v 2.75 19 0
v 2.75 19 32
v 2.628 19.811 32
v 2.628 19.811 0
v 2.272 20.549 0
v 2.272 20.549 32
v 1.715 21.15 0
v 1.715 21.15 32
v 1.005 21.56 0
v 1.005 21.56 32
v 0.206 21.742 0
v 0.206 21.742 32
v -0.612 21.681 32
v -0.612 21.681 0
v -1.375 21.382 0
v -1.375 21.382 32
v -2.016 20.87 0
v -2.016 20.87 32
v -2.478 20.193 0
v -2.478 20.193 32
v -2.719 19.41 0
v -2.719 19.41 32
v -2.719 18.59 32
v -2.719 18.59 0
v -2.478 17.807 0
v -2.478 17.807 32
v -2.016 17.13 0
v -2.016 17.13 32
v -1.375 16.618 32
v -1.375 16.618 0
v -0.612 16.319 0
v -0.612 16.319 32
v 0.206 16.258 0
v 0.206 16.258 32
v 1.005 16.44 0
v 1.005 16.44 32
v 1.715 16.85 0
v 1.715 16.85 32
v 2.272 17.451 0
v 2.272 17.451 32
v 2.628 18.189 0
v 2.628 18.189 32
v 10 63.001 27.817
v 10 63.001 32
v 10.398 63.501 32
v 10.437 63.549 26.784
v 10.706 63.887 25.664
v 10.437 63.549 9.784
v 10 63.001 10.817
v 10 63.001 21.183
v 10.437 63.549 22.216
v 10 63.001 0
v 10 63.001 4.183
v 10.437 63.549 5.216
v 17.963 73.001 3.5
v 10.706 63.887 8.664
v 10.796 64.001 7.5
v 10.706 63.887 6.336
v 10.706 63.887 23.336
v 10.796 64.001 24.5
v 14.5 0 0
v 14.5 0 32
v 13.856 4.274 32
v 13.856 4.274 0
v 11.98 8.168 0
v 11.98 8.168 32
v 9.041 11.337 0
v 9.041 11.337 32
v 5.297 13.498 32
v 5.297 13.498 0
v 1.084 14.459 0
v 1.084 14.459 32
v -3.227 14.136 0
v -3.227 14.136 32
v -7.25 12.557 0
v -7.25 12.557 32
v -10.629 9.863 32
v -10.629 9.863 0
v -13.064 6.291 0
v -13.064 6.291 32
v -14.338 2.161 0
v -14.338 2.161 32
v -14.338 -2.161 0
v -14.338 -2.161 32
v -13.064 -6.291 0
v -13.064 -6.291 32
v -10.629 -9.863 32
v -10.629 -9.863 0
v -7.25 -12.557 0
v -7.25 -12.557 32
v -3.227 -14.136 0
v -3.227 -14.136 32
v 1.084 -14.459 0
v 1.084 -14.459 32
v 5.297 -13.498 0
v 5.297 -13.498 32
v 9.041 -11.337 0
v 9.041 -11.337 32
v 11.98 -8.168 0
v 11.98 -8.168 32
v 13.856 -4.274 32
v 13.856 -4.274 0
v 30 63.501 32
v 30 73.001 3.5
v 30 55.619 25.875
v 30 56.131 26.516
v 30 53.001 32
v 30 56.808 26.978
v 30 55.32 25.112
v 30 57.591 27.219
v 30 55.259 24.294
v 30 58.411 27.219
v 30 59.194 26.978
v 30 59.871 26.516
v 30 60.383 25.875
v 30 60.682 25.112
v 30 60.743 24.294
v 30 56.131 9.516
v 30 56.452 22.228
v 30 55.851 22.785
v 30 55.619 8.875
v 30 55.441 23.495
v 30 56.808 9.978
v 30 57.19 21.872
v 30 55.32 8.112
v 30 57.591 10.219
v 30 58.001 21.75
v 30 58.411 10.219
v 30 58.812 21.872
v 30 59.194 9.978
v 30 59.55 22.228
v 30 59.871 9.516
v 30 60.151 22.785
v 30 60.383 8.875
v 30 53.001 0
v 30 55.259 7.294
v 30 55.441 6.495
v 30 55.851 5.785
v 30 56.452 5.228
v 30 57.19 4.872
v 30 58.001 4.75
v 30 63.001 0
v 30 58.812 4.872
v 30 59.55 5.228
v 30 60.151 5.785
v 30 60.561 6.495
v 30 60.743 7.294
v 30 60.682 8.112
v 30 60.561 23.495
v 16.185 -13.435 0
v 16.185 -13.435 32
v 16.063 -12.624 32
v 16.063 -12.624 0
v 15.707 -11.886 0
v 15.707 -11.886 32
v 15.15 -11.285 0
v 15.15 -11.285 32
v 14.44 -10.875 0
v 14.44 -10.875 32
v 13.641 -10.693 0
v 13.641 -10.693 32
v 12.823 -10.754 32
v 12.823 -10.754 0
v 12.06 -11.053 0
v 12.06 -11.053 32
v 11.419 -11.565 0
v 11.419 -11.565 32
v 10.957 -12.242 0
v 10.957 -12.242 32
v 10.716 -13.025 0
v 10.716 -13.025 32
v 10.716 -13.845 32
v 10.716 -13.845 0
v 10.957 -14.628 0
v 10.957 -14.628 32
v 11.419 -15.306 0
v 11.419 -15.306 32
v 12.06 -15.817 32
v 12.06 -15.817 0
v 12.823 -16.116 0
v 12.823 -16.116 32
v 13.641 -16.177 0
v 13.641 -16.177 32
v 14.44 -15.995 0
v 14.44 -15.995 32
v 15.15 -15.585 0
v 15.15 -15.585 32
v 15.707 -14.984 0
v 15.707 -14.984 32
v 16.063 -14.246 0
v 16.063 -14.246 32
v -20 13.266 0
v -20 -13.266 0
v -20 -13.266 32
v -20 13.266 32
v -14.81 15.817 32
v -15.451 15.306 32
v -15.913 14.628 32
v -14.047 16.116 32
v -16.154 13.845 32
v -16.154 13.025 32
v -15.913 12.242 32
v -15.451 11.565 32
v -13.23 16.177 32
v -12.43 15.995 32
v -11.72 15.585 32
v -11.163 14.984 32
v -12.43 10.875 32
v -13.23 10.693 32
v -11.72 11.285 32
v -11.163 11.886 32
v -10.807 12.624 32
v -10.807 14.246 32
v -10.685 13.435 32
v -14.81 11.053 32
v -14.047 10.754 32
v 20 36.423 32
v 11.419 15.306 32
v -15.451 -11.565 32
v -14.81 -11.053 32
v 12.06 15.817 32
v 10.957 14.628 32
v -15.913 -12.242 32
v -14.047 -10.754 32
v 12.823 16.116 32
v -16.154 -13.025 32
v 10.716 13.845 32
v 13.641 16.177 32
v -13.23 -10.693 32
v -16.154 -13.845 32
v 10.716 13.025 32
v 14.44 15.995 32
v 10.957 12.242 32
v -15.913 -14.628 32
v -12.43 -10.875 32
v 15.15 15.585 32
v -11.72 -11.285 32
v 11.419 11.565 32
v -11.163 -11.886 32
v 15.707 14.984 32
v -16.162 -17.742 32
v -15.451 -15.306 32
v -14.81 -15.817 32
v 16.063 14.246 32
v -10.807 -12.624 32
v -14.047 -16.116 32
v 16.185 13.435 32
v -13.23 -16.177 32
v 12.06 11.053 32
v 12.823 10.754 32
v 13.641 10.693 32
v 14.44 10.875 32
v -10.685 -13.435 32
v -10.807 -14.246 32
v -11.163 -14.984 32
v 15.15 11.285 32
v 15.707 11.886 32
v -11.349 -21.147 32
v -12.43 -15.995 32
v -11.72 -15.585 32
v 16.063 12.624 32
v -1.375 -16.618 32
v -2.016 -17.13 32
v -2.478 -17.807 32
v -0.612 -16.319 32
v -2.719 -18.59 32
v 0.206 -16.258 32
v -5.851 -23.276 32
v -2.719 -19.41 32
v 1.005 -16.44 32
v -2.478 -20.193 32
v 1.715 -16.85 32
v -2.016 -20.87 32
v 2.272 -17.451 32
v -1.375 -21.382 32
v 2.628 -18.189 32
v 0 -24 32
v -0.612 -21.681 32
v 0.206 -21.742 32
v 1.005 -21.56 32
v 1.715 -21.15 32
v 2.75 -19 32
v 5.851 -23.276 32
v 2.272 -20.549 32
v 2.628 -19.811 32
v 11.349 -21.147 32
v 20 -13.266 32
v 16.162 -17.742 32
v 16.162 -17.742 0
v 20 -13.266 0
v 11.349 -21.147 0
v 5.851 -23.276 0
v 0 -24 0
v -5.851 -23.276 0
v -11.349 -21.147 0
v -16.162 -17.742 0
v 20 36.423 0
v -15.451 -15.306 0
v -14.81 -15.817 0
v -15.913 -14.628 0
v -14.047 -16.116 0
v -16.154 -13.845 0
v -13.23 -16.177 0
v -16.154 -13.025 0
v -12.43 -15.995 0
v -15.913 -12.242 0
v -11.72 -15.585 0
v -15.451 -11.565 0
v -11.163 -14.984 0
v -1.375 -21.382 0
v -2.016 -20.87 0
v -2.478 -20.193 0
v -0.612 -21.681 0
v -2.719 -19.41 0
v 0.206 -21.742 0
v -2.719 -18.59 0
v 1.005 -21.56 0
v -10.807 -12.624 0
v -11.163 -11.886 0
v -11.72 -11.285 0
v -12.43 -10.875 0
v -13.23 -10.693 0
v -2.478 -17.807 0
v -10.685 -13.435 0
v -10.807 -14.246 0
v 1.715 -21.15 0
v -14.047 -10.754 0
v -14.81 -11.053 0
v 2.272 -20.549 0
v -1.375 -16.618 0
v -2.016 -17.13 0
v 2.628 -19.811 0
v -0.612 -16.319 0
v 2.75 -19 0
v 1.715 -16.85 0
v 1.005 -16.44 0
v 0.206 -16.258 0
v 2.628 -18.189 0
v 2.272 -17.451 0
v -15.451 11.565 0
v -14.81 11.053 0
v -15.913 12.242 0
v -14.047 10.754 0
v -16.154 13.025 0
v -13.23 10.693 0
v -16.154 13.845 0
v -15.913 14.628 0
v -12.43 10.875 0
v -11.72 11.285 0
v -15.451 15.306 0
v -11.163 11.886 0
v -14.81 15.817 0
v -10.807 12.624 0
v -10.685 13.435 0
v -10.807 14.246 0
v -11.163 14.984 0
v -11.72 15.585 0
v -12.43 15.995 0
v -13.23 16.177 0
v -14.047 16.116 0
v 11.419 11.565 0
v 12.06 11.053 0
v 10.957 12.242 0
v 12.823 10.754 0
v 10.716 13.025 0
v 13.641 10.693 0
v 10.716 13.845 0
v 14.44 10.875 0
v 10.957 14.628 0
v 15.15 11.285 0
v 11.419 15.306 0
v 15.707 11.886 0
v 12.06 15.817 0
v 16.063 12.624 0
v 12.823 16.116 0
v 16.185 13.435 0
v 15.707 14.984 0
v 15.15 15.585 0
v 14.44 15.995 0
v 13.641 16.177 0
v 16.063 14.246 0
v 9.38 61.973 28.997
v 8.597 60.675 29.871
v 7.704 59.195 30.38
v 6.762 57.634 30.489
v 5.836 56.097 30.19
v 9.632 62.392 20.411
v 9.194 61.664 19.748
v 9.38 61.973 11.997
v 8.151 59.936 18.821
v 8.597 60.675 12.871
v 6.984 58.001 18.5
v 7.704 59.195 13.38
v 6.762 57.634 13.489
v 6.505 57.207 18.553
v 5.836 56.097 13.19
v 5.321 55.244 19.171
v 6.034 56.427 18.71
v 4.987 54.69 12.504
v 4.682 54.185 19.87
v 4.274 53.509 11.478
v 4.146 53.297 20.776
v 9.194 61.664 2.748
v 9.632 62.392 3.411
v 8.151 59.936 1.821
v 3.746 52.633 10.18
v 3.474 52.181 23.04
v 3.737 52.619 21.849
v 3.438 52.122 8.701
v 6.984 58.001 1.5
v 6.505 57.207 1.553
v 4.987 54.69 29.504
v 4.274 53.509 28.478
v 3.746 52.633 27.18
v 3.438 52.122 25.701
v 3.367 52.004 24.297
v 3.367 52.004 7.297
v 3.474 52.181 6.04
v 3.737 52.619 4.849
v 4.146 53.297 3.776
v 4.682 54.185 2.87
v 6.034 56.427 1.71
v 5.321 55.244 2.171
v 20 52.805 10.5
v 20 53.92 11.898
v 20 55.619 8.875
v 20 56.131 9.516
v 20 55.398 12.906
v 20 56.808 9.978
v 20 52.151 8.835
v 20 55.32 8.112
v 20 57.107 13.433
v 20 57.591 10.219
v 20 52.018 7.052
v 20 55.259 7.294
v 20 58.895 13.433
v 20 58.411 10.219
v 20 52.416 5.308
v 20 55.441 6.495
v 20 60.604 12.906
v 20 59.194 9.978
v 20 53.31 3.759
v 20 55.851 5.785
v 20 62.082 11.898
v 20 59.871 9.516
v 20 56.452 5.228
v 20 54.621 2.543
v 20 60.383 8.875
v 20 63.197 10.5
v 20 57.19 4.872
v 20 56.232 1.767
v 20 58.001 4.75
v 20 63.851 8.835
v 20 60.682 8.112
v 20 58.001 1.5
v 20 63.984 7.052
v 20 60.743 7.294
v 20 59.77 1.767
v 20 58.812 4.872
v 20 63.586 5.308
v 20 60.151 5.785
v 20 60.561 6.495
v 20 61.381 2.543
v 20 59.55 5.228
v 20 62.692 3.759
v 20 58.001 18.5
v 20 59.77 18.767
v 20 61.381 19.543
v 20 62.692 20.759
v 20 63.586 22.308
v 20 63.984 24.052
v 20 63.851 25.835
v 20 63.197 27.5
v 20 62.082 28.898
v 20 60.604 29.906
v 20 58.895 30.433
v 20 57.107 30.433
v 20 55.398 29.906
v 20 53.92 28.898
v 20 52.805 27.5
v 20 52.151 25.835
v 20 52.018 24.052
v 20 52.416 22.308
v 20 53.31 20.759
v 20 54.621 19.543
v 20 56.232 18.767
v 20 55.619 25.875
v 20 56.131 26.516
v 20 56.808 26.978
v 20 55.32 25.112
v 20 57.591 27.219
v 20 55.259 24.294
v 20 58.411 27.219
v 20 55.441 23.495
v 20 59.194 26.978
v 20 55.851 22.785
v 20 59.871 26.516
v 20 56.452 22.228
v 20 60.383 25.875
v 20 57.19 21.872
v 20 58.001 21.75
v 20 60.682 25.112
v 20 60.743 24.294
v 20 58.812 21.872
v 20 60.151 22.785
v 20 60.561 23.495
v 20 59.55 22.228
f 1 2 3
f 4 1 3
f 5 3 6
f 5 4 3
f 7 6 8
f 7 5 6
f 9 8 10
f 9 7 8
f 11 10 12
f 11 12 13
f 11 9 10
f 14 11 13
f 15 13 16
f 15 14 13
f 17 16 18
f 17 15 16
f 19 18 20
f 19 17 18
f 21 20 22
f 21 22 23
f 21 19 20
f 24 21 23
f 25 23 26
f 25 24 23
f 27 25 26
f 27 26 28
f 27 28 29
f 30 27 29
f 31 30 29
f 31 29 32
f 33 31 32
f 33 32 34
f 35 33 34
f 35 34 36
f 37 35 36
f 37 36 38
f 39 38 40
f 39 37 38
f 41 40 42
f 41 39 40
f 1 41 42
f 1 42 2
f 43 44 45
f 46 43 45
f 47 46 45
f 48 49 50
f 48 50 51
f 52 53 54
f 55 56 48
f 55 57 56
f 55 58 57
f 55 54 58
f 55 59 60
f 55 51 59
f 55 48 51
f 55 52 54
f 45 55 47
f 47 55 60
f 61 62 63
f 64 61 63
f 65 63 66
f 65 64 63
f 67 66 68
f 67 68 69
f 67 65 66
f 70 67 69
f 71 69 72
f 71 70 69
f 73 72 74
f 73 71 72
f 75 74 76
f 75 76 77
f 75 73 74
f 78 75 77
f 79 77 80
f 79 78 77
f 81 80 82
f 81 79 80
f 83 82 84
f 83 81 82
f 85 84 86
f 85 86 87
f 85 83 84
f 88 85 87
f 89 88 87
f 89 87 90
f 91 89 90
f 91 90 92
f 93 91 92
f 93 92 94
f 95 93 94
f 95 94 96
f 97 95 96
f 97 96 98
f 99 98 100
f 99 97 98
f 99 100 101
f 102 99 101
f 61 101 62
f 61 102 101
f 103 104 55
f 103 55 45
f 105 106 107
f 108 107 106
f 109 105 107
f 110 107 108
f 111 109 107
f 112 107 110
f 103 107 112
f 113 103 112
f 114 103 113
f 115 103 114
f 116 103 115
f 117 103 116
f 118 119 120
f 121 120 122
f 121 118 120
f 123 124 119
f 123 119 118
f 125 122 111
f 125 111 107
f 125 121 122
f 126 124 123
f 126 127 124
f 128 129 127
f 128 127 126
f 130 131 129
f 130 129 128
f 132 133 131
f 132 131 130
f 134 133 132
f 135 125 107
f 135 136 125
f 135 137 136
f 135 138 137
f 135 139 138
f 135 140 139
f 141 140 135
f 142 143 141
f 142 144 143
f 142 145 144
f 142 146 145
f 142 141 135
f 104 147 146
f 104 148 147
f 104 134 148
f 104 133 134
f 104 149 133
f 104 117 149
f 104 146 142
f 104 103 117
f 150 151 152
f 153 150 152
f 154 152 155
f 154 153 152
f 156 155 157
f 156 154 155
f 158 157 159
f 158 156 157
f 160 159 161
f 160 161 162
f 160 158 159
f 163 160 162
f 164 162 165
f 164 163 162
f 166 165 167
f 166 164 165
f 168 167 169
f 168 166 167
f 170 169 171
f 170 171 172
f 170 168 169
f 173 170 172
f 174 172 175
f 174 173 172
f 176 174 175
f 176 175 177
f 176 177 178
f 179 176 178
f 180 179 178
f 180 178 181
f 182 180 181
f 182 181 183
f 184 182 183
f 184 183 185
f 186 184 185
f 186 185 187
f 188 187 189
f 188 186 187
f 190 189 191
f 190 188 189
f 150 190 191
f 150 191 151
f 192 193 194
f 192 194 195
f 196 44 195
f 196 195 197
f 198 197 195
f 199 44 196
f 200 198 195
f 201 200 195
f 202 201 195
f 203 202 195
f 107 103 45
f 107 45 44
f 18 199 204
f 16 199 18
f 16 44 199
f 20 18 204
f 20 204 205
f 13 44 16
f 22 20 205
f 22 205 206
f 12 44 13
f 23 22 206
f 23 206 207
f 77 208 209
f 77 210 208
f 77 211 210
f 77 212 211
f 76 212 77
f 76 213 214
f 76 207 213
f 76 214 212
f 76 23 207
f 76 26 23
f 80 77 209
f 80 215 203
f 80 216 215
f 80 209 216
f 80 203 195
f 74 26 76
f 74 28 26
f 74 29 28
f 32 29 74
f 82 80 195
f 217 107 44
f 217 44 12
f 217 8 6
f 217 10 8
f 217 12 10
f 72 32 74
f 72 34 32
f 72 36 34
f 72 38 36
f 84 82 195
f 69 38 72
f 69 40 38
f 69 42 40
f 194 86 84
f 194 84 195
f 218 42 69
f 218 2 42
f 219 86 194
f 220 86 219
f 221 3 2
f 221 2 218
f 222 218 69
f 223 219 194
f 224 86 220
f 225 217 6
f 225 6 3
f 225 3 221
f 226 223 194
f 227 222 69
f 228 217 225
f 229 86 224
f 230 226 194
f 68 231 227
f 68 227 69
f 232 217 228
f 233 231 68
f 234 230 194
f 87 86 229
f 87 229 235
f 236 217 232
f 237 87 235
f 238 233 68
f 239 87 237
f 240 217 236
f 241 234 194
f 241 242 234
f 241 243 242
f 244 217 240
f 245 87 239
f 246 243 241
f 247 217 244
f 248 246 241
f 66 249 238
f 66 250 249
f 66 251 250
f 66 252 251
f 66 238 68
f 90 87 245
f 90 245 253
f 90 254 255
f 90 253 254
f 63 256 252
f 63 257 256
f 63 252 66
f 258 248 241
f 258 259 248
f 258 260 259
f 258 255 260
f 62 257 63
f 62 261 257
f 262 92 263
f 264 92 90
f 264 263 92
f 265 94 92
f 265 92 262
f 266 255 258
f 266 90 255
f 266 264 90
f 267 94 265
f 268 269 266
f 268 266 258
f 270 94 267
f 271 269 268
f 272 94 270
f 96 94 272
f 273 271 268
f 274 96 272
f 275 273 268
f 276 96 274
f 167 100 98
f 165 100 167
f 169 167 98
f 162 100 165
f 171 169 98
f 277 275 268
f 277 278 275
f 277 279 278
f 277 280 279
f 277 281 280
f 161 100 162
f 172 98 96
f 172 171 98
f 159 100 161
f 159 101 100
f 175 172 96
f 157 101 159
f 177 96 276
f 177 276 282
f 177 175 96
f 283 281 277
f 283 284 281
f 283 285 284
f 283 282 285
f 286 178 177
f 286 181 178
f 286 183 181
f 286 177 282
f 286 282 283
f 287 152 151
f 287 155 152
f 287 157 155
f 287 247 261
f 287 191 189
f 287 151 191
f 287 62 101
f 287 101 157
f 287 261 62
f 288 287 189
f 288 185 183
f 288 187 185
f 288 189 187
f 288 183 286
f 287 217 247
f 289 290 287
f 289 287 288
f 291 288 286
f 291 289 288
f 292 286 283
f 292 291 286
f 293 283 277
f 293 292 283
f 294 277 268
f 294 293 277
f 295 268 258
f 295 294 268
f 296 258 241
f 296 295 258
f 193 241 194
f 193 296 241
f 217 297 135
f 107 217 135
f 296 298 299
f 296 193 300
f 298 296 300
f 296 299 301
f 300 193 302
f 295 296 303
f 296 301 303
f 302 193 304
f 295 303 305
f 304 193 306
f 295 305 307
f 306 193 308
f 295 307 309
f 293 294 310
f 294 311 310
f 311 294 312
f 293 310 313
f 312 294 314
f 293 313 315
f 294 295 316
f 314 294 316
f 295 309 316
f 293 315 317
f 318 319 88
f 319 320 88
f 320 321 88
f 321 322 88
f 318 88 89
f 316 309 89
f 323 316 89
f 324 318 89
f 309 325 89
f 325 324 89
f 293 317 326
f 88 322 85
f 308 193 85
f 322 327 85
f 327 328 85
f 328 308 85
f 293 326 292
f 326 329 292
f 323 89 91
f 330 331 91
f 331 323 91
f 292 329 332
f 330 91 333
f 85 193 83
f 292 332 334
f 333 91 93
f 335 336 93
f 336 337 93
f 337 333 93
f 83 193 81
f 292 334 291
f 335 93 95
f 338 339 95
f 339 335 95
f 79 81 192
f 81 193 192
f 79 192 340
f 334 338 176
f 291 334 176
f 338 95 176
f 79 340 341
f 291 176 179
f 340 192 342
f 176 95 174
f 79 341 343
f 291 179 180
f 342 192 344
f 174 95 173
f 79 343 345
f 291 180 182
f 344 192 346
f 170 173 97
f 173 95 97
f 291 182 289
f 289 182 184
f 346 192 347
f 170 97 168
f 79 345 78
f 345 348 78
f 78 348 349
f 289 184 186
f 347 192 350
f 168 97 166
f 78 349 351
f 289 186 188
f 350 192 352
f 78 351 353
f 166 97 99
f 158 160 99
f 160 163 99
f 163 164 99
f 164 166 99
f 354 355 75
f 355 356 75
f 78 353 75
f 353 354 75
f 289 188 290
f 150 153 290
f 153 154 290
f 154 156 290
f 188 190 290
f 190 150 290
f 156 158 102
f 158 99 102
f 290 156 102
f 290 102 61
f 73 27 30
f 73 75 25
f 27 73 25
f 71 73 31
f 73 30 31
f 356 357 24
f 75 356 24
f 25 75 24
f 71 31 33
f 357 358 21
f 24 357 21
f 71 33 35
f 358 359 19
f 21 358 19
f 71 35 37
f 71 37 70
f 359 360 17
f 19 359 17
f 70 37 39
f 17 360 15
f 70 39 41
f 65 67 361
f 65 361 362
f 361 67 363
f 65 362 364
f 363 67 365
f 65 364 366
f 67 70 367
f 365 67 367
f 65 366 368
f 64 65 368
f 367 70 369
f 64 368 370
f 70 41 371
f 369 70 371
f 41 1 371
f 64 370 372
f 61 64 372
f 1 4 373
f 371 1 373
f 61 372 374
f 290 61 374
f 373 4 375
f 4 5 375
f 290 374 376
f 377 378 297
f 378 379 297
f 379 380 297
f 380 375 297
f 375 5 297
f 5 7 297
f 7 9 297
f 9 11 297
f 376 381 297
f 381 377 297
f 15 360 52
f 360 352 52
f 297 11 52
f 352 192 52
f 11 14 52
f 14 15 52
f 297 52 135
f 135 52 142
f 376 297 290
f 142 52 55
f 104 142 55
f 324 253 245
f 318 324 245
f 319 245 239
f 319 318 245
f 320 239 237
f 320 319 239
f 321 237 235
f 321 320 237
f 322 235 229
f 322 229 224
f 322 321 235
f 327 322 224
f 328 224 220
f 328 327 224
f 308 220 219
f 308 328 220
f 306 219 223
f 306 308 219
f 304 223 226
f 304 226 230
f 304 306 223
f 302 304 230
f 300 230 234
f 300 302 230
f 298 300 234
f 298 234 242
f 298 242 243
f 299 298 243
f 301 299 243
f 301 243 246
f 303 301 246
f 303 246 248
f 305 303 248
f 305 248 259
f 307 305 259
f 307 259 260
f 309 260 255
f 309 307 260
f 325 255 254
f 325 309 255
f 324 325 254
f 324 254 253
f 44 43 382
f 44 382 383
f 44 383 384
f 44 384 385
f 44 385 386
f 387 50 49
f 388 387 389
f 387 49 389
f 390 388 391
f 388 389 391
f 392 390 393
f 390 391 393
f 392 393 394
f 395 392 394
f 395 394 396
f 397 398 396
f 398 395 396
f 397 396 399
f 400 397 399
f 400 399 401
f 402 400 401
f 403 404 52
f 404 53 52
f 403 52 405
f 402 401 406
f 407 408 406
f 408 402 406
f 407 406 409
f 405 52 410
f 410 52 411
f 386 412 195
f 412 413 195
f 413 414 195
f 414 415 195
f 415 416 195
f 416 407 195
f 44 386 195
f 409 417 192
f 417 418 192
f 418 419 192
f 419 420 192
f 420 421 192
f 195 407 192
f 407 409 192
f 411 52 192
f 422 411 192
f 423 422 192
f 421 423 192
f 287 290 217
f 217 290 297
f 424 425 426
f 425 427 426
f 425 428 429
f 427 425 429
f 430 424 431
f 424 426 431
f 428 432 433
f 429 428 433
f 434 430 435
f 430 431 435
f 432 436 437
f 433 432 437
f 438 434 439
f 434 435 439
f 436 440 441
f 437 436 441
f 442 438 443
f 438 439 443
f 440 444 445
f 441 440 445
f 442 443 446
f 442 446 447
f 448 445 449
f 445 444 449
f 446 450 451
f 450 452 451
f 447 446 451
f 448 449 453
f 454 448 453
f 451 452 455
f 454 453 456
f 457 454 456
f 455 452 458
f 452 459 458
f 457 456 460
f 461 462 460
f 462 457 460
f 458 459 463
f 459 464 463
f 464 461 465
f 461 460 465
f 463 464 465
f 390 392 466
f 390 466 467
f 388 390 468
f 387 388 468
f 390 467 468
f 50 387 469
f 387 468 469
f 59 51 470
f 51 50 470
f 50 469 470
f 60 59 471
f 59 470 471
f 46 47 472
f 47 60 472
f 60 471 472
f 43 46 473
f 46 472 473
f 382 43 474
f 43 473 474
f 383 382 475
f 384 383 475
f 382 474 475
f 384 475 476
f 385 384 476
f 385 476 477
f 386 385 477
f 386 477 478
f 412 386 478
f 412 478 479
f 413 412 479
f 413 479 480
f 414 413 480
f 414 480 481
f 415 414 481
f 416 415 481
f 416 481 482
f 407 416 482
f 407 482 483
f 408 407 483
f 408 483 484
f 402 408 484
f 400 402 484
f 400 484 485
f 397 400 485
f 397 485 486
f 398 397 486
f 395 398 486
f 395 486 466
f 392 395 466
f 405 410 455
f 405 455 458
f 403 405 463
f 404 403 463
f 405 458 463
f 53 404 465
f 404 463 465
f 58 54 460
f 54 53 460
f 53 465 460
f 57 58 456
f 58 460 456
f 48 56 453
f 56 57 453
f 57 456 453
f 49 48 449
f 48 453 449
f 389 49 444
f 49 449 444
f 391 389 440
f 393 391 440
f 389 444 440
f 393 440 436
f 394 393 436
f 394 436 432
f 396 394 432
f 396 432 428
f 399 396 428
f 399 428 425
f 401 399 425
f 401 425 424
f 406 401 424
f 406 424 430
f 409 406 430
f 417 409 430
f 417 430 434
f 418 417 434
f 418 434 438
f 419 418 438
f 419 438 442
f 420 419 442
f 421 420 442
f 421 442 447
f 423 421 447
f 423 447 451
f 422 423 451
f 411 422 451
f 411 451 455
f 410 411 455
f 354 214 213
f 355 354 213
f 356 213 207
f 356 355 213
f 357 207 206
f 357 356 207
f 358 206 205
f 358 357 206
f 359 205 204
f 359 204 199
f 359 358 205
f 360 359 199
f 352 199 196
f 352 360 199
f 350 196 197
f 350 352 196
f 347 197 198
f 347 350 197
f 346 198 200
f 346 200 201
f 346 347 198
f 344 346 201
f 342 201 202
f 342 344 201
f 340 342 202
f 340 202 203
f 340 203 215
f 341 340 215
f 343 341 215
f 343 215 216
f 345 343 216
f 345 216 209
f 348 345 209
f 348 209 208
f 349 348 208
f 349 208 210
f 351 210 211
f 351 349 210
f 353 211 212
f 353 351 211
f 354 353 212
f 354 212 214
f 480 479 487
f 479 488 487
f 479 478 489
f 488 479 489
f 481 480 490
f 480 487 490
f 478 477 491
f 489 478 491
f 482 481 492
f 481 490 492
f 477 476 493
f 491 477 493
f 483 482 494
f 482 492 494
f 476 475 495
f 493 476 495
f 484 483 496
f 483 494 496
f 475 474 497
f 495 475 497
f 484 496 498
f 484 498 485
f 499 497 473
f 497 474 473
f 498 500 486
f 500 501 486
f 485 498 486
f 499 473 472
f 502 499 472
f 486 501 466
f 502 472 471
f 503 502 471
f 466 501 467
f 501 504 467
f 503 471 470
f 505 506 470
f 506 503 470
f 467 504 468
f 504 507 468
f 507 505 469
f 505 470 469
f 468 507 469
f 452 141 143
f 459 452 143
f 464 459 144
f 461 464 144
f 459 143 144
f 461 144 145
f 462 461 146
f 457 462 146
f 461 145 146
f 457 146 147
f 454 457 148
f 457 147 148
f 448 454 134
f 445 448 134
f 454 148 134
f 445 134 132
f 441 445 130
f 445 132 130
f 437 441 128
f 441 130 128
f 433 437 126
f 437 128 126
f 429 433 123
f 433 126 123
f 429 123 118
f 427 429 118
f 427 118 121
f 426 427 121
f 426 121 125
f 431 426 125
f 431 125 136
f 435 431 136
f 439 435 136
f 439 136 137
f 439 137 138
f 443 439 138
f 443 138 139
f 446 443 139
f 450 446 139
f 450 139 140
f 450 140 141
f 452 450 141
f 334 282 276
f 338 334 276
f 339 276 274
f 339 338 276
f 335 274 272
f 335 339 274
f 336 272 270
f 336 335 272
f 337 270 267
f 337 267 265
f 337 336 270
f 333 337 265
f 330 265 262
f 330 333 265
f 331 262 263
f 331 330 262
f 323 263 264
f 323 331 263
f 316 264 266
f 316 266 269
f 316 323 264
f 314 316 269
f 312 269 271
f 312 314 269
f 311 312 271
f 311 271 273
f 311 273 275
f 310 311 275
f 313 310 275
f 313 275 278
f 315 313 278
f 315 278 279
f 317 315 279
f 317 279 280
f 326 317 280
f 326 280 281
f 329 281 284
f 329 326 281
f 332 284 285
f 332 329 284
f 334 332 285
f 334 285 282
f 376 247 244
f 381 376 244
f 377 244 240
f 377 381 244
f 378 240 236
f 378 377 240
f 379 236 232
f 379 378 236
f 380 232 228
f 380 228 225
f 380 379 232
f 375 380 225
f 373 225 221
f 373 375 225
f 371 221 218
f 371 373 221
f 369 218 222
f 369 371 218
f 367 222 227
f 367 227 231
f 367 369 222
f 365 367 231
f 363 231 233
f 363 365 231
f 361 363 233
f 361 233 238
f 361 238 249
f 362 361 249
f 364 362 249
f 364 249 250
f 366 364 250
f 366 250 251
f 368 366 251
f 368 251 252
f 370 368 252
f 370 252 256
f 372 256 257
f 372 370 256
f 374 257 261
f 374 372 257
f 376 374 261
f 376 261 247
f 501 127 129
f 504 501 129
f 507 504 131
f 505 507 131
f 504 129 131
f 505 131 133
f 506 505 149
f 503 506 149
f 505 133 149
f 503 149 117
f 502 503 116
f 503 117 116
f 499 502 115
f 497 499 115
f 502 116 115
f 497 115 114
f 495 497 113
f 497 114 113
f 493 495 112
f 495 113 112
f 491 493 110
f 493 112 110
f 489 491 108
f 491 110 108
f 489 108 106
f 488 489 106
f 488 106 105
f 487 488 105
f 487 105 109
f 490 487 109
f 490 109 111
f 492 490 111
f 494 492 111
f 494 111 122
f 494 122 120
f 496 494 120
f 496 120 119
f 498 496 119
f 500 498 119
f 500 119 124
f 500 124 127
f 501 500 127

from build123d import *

# Parameters (mm, degrees)
ESQUISSE2_R             = 2.75
ESQUISSE2_R_2           = 14.5
BOSS_EXTRU_1_DEPTH      = 32
BOSS_EXTRU_4_DEPTH      = 32
ENL_V_MAT_EXTRU_3_REACH = 88.563
ESQUISSE10_R            = 2.75
BOSS_EXTRU_6_DEPTH      = 20
ENL_V_MAT_EXTRU_4_REACH = 87.165
ENL_V_MAT_EXTRU_5_REACH = 91.18
ESQUISSE13_R            = 6


with BuildPart() as part:
    # Esquisse2 → Boss.-Extru.1 (new body)
    with BuildSketch(Plane.XY):
        with BuildLine():
            Line((20, 13.266499161), (20, -13.266499161))
            ThreePointArc((20, -13.266499161), (0, -24), (-20, -13.266499161))
            Line((-20, -13.266499161), (-20, 13.266499161))
            ThreePointArc((-20, 13.266499161), (0, 24), (20, 13.266499161))
        make_face()
        with Locations((0, 19)):
            Circle(ESQUISSE2_R, mode=Mode.SUBTRACT)
        with Locations((-13.435028843, 13.435028843)):
            Circle(ESQUISSE2_R, mode=Mode.SUBTRACT)
        with Locations((13.435028843, 13.435028843)):
            Circle(ESQUISSE2_R, mode=Mode.SUBTRACT)
        with Locations((0, -19)):
            Circle(ESQUISSE2_R, mode=Mode.SUBTRACT)
        with Locations((13.435028843, -13.435028843)):
            Circle(ESQUISSE2_R, mode=Mode.SUBTRACT)
        with Locations((-13.435028843, -13.435028843)):
            Circle(ESQUISSE2_R, mode=Mode.SUBTRACT)
        Circle(ESQUISSE2_R_2, mode=Mode.SUBTRACT)
    extrude(amount=BOSS_EXTRU_1_DEPTH)

    # Esquisse7 → Boss.-Extru.4 (add)
    with BuildSketch(Plane(origin=(0, 0, 0), x_dir=(-1, 0, 0), z_dir=(0, 0, -1))):
        with BuildLine():
            Line((-10, 63.000996071), (20, 13.266499161))
            ThreePointArc((20, 13.266499161), (0, 24), (-20, 13.266499161))
            Line((-20, 13.266499161), (-20, 36.422830435))
            Line((-20, 36.422830435), (-30, 53.000996071))
            Line((-30, 53.000996071), (-30, 63.000996071))
            Line((-30, 63.000996071), (-10, 63.000996071))
        make_face()
    extrude(amount=-BOSS_EXTRU_4_DEPTH)

    # Enlèv. mat.-Extru.3: up to this plane
    enl_v_mat_extru_3_end = Plane(origin=(10, 63.000996071, 102.523188973), z_dir=(-0.8562805371039014, 0.5165110277400223, 0))
    # Esquisse10 → Enlèv. mat.-Extru.3 (cut, up to the surface)
    with BuildSketch(Plane(origin=(30, 0, 0), x_dir=(0, 0, -1), z_dir=(1, 0, 0)), mode=Mode.PRIVATE) as enl_v_mat_extru_3_sk1:
        with Locations((-24.5, 58.000996071)):
            Circle(ESQUISSE10_R)
    enl_v_mat_extru_3_tool1 = split(extrude(enl_v_mat_extru_3_sk1.sketch, amount=-ENL_V_MAT_EXTRU_3_REACH, mode=Mode.PRIVATE), bisect_by=enl_v_mat_extru_3_end, keep=Keep.BOTH, mode=Mode.PRIVATE)
    add(enl_v_mat_extru_3_tool1.solids().sort_by_distance((30, 58.000996, 24.5))[0], mode=Mode.SUBTRACT)
    # Esquisse10 → Enlèv. mat.-Extru.3 (cut, up to the surface)
    with BuildSketch(Plane(origin=(30, 0, 0), x_dir=(0, 0, -1), z_dir=(1, 0, 0)), mode=Mode.PRIVATE) as enl_v_mat_extru_3_sk2:
        with Locations((-7.5, 58.000996071)):
            Circle(ESQUISSE10_R)
    enl_v_mat_extru_3_tool2 = split(extrude(enl_v_mat_extru_3_sk2.sketch, amount=-ENL_V_MAT_EXTRU_3_REACH, mode=Mode.PRIVATE), bisect_by=enl_v_mat_extru_3_end, keep=Keep.BOTH, mode=Mode.PRIVATE)
    add(enl_v_mat_extru_3_tool2.solids().sort_by_distance((30, 58.000996, 7.5))[0], mode=Mode.SUBTRACT)

    # Esquisse11 → Boss.-Extru.6 (add)
    with BuildSketch(Plane(origin=(30, 0, 0), x_dir=(0, 0, -1), z_dir=(1, 0, 0))):
        Polygon((-32, 63.000996071), (0, 63.000996071), (-3.5, 73.000996071), (-32, 63.500996071), align=None)
    extrude(amount=-BOSS_EXTRU_6_DEPTH)

    # Esquisse12 → Enlèv. mat.-Extru.4 (cut, up to next)
    with BuildSketch(Plane(origin=(0, 0, 0), x_dir=(-1, 0, 0), z_dir=(0, 0, -1)), mode=Mode.PRIVATE) as enl_v_mat_extru_4_sk1:
        Polygon((-10, 63.000996071), (-17.962764916, 73.000996071), (-10, 73.000996071), align=None)
    enl_v_mat_extru_4_tool1 = extrude(enl_v_mat_extru_4_sk1.sketch, amount=-ENL_V_MAT_EXTRU_4_REACH, mode=Mode.PRIVATE) & part.part
    add(enl_v_mat_extru_4_tool1.solids().sort_by_distance((12.654255, 69.667663, 0))[0], mode=Mode.SUBTRACT)

    # Esquisse13 → Enlèv. mat.-Extru.5 (cut, up to next)
    with BuildSketch(Plane(origin=(20, 0, 0), x_dir=(0, 0, -1), z_dir=(1, 0, 0)), mode=Mode.PRIVATE) as enl_v_mat_extru_5_sk1:
        with Locations((-7.5, 58.000996071)):
            Circle(ESQUISSE13_R)
    enl_v_mat_extru_5_tool1 = extrude(enl_v_mat_extru_5_sk1.sketch, amount=-ENL_V_MAT_EXTRU_5_REACH, mode=Mode.PRIVATE) & part.part
    # Esquisse13 → Enlèv. mat.-Extru.5 (cut, up to next)
    with BuildSketch(Plane(origin=(20, 0, 0), x_dir=(0, 0, -1), z_dir=(1, 0, 0)), mode=Mode.PRIVATE) as enl_v_mat_extru_5_sk2:
        with Locations((-24.5, 58.000996071)):
            Circle(ESQUISSE13_R)
    enl_v_mat_extru_5_tool2 = extrude(enl_v_mat_extru_5_sk2.sketch, amount=-ENL_V_MAT_EXTRU_5_REACH, mode=Mode.PRIVATE) & part.part
    add(enl_v_mat_extru_5_tool1.solids().sort_by_distance((20, 58.000996, 7.5))[0], mode=Mode.SUBTRACT)
    add(enl_v_mat_extru_5_tool2.solids().sort_by_distance((20, 58.000996, 24.5))[0], mode=Mode.SUBTRACT)


solid = part.part
